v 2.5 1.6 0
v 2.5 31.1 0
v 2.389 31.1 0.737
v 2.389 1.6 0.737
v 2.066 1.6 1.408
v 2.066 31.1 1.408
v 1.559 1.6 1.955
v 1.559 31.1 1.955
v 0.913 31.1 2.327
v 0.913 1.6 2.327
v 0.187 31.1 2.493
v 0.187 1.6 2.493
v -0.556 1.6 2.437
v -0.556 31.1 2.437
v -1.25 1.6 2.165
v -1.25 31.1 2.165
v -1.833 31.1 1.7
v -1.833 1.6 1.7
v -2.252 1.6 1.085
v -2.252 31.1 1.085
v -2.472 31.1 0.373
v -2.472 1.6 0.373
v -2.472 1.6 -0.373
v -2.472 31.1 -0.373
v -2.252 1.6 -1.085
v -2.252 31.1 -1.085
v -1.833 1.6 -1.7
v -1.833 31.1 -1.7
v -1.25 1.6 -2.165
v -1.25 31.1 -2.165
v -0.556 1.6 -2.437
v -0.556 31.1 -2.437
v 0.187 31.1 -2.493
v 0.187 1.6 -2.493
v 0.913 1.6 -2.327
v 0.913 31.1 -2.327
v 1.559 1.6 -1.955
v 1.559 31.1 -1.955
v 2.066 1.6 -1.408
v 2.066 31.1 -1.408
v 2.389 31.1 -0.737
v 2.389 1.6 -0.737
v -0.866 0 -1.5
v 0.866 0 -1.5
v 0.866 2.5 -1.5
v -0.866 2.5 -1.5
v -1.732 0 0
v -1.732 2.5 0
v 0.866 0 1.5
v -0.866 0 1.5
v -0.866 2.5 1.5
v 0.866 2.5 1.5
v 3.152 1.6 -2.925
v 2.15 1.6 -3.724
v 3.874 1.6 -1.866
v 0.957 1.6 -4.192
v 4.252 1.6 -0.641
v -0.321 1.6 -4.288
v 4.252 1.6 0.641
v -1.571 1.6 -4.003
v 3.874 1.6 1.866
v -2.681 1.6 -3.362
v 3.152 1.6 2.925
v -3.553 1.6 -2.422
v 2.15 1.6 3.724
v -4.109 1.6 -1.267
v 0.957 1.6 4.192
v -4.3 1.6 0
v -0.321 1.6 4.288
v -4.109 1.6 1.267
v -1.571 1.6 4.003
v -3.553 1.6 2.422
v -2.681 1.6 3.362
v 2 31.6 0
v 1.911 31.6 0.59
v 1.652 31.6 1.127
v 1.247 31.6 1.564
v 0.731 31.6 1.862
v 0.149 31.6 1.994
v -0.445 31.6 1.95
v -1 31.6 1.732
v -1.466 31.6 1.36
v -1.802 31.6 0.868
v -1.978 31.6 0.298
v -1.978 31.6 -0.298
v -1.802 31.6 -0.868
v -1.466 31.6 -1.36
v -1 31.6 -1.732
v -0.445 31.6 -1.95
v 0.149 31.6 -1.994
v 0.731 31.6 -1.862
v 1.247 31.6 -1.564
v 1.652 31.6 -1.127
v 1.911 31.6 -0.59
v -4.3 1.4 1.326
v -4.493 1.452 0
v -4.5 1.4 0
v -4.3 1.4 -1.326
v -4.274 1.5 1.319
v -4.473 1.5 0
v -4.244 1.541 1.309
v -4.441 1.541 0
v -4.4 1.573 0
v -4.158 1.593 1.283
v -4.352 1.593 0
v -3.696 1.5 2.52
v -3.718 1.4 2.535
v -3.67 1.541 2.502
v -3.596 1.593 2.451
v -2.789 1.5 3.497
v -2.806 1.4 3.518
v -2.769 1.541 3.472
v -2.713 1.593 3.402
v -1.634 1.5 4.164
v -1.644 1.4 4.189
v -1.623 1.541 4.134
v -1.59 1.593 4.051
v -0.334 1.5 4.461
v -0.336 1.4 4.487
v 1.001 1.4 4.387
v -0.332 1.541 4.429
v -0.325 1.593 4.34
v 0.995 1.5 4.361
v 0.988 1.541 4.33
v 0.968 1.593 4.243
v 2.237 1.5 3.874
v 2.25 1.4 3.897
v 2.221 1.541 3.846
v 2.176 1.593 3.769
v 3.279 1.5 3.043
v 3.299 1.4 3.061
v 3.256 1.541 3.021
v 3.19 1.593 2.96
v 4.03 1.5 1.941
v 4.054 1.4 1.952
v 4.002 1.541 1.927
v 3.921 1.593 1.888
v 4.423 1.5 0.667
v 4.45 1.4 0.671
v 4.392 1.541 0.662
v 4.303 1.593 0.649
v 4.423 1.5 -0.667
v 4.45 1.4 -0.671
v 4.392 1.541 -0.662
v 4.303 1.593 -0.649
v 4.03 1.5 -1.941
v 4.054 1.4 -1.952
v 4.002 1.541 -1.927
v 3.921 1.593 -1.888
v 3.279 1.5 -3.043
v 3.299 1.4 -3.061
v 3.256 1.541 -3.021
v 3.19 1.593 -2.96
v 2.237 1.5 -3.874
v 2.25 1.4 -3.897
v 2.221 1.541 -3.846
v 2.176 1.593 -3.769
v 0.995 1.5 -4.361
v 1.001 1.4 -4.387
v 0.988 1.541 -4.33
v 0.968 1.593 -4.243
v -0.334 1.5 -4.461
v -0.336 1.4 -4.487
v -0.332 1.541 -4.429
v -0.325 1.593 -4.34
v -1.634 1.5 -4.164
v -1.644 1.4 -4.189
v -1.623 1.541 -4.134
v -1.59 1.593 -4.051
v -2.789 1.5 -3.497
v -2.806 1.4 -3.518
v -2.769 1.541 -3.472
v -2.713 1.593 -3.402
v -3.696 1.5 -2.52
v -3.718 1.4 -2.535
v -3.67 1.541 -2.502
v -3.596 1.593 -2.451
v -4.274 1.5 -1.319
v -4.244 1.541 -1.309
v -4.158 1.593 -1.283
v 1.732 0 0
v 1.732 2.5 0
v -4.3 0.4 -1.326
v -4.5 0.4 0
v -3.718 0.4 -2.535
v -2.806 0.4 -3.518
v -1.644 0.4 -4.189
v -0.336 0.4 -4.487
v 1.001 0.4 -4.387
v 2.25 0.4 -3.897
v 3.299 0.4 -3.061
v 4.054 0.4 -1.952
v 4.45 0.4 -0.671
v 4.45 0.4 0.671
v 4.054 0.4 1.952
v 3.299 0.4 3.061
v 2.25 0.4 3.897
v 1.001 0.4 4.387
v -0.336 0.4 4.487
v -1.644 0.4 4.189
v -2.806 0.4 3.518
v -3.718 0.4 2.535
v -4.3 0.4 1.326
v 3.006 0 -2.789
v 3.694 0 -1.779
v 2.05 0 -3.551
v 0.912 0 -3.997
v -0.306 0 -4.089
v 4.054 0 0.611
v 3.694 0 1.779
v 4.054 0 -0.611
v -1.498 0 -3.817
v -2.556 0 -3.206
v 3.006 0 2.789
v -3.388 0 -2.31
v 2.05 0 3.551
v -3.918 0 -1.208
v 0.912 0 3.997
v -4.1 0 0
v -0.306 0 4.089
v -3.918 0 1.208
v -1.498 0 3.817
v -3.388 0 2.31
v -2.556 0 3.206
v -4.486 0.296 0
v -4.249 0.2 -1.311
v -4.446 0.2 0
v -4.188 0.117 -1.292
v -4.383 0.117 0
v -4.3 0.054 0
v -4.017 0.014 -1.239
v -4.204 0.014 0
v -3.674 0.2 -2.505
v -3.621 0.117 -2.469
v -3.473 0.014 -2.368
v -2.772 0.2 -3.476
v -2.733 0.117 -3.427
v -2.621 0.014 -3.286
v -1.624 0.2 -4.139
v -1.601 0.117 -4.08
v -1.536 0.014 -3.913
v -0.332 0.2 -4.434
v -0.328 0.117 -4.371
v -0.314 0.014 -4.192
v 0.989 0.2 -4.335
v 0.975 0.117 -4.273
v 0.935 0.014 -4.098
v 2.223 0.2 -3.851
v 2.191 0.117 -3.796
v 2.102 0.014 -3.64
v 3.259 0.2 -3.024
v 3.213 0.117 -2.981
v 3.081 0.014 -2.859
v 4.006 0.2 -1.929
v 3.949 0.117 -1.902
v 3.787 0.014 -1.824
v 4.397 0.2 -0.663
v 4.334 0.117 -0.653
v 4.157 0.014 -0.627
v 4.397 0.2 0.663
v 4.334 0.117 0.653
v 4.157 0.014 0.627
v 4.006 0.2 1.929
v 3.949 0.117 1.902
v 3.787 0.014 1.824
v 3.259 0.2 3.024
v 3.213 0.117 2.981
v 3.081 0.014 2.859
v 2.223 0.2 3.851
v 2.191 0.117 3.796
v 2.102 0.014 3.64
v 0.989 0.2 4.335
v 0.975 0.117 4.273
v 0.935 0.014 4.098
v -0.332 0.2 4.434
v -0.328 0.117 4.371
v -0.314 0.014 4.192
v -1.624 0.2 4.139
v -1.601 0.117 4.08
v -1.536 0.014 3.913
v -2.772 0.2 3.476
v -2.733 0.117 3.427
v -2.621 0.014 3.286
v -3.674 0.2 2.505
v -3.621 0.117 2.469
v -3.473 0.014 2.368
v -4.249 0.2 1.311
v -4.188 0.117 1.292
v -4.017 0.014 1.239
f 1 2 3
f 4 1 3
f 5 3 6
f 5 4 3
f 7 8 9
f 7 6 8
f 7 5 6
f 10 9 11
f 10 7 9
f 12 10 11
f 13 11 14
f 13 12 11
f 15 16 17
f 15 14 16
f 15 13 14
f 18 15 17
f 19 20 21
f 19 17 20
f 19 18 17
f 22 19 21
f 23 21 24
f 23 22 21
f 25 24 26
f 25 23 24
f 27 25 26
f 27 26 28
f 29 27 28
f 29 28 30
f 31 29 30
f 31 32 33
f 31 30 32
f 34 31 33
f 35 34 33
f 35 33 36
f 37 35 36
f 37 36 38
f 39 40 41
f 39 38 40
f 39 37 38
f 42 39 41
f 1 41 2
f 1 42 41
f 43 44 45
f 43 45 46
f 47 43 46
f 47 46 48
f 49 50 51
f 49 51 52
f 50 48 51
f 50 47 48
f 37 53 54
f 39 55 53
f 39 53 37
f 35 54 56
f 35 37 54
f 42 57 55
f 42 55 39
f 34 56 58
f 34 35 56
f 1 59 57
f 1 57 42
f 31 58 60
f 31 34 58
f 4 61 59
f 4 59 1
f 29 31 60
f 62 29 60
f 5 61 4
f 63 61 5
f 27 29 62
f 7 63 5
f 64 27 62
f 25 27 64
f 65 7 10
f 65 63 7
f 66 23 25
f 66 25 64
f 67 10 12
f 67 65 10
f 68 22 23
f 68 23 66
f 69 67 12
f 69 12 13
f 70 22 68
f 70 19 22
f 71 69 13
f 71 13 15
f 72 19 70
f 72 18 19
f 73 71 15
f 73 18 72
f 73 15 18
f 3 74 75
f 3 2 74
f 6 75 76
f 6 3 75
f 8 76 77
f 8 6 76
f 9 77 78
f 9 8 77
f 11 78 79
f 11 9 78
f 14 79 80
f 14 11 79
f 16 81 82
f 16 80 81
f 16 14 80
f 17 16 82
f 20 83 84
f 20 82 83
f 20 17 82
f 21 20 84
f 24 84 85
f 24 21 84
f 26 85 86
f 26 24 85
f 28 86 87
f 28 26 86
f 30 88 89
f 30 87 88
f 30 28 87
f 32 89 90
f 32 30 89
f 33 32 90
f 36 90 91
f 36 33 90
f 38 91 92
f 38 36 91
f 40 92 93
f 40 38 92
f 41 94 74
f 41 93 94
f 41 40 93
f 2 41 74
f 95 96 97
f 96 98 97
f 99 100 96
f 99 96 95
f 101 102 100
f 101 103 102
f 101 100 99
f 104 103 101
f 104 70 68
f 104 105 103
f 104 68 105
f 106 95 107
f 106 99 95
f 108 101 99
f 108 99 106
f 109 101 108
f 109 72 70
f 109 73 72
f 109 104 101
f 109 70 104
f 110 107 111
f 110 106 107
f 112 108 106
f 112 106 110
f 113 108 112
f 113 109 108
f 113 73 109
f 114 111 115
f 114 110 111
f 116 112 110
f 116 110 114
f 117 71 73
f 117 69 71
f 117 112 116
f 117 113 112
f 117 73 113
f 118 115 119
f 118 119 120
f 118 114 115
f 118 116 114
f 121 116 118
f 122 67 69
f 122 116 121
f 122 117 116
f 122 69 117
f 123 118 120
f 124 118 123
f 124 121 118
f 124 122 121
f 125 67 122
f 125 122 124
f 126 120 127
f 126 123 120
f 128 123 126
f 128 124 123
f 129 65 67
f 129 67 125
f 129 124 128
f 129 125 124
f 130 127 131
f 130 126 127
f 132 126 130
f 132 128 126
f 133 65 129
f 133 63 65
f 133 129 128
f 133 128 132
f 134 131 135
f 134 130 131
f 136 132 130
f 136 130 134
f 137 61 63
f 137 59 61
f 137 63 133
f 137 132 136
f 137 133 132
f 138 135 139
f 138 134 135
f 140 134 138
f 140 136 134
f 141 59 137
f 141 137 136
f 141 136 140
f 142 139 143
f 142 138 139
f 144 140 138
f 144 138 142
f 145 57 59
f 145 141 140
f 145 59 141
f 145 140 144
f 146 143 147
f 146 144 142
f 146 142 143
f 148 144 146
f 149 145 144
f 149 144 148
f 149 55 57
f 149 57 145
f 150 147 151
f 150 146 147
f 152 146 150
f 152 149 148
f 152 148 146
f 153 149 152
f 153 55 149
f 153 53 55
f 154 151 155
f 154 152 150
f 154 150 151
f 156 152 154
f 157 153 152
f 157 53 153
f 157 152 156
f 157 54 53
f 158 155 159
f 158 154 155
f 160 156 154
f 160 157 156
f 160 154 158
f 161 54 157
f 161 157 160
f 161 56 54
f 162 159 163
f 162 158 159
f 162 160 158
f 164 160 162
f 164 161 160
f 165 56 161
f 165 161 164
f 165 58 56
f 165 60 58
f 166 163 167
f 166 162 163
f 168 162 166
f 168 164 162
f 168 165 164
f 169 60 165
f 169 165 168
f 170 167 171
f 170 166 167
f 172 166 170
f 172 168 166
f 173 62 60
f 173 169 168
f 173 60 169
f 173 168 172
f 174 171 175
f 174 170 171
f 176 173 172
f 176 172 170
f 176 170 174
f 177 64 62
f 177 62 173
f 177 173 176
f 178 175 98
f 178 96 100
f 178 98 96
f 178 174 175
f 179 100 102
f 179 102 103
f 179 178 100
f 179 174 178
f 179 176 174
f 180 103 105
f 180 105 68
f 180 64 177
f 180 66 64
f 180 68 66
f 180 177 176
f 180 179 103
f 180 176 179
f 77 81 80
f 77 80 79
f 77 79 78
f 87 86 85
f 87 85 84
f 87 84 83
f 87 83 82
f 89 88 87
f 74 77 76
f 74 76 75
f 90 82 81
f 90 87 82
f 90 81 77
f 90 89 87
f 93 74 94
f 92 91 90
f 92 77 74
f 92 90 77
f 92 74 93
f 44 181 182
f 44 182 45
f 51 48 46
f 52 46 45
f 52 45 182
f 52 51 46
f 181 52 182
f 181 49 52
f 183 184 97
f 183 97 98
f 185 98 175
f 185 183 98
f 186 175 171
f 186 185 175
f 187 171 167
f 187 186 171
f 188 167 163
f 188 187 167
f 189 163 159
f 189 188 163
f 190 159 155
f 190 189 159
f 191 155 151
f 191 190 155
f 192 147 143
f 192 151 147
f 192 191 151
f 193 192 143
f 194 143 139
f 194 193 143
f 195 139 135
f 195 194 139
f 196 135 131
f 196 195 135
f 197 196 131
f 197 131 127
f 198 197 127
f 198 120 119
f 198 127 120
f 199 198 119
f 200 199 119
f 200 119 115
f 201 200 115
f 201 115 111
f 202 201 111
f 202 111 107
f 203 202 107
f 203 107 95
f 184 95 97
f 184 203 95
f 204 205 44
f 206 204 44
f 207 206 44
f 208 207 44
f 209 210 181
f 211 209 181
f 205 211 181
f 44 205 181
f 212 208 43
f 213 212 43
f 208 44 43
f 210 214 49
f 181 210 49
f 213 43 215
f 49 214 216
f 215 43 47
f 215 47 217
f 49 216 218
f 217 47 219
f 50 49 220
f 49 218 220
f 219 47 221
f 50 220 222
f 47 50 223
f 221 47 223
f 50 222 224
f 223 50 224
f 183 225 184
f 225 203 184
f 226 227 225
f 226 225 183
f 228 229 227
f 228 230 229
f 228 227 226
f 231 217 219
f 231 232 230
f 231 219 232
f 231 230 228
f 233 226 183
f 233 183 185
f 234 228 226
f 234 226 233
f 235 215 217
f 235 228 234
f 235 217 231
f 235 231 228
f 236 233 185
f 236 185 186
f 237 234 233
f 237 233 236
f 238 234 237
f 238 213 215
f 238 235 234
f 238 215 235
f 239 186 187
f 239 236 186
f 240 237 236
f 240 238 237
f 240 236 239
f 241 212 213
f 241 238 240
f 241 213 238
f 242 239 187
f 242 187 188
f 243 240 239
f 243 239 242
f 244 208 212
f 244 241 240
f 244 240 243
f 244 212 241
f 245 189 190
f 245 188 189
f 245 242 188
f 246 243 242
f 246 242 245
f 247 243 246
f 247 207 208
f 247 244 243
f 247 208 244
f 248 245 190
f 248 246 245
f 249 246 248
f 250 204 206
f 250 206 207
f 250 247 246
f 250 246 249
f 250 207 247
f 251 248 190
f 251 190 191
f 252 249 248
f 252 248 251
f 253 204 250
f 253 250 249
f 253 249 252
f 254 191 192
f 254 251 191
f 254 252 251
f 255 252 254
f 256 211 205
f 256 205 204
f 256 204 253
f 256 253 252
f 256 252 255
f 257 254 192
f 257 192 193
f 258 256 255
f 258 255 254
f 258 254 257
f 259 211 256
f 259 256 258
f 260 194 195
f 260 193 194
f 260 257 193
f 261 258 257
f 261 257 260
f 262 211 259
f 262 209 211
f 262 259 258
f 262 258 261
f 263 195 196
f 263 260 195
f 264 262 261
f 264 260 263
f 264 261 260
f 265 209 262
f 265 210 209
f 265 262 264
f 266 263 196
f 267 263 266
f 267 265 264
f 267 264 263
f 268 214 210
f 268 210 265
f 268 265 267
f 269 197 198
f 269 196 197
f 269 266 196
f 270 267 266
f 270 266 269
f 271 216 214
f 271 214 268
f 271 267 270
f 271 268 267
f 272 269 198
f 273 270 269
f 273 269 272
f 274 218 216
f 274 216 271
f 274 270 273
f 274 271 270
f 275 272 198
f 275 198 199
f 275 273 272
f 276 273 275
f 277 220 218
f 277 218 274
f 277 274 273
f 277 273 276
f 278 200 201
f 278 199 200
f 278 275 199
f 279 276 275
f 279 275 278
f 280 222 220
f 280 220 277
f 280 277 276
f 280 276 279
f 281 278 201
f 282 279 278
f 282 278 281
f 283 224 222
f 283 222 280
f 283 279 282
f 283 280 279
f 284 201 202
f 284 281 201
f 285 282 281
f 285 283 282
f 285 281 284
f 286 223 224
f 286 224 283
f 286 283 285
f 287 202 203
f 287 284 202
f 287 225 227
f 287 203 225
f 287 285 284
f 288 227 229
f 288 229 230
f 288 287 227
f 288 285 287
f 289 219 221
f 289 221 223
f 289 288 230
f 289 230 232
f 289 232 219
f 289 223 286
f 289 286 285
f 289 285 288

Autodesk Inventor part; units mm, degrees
ref_plane "YZ Plane" through (0, 0, 0) normal (1, 0, 0) x (0, 1, 0)
ref_plane "XZ Plane" through (0, 0, 0) normal (0, 1, 0) x (-1, 0, 0)
ref_plane "XY Plane" through (0, 0, 0) normal (0, 0, 1) x (1, 0, 0)
sketch "Boceto1" plane through (0, 0, 0) normal (0, 1, 0) x (-1, 0, 0)
  circle A0 centre (0, 0) radius 4.5
  dimension "d0" = 9
extrude "Extrusión1" add sketch "Boceto1" along normal blind 1.6
sketch "Boceto2" plane through (0, 1.6, 0) normal (0, 1, 0) x (1, 0, 0)
  circle A0 centre (0, 0) radius 2.5
  dimension "d3" = 5
extrude "Extrusión2" add sketch "Boceto2" along normal blind 30
fillet "Empalme1" radius 0.4 1 edges at (4.5, 0, 0)
fillet "Empalme2" radius 0.2 1 edges at (4.5, 1.6, 0)
sketch "Boceto3" plane through (0, 0, 0) normal (0, -1, 0) x (1, 0, 0)
  line L0 (-1.7321, 0) -> (-0.866, 1.5)
  line L1 (-0.866, 1.5) -> (0.866, 1.5)
  line L2 (0.866, 1.5) -> (1.7321, 0)
  line L3 (1.7321, 0) -> (0.866, -1.5)
  line L4 (0.866, -1.5) -> (-0.866, -1.5)
  line L5 (-0.866, -1.5) -> (-1.7321, 0)
  point P0 (0, 0)
  point P1 (0, 0)
  dimension "d8" = 3
extrude "Extrusión3" cut sketch "Boceto3" against normal blind 2.5
chamfer "Chaflán1" distance 0.5 angle 45 1 edges at (-2.5, 31.6, 0)
thread "Rosca2" size "M5x0.8" class "6g" standard "ANSI Metric M Profile" length 12 offset 17
properties part number "Perno M5x8cabeza plana_" material "Hierro, gris"
